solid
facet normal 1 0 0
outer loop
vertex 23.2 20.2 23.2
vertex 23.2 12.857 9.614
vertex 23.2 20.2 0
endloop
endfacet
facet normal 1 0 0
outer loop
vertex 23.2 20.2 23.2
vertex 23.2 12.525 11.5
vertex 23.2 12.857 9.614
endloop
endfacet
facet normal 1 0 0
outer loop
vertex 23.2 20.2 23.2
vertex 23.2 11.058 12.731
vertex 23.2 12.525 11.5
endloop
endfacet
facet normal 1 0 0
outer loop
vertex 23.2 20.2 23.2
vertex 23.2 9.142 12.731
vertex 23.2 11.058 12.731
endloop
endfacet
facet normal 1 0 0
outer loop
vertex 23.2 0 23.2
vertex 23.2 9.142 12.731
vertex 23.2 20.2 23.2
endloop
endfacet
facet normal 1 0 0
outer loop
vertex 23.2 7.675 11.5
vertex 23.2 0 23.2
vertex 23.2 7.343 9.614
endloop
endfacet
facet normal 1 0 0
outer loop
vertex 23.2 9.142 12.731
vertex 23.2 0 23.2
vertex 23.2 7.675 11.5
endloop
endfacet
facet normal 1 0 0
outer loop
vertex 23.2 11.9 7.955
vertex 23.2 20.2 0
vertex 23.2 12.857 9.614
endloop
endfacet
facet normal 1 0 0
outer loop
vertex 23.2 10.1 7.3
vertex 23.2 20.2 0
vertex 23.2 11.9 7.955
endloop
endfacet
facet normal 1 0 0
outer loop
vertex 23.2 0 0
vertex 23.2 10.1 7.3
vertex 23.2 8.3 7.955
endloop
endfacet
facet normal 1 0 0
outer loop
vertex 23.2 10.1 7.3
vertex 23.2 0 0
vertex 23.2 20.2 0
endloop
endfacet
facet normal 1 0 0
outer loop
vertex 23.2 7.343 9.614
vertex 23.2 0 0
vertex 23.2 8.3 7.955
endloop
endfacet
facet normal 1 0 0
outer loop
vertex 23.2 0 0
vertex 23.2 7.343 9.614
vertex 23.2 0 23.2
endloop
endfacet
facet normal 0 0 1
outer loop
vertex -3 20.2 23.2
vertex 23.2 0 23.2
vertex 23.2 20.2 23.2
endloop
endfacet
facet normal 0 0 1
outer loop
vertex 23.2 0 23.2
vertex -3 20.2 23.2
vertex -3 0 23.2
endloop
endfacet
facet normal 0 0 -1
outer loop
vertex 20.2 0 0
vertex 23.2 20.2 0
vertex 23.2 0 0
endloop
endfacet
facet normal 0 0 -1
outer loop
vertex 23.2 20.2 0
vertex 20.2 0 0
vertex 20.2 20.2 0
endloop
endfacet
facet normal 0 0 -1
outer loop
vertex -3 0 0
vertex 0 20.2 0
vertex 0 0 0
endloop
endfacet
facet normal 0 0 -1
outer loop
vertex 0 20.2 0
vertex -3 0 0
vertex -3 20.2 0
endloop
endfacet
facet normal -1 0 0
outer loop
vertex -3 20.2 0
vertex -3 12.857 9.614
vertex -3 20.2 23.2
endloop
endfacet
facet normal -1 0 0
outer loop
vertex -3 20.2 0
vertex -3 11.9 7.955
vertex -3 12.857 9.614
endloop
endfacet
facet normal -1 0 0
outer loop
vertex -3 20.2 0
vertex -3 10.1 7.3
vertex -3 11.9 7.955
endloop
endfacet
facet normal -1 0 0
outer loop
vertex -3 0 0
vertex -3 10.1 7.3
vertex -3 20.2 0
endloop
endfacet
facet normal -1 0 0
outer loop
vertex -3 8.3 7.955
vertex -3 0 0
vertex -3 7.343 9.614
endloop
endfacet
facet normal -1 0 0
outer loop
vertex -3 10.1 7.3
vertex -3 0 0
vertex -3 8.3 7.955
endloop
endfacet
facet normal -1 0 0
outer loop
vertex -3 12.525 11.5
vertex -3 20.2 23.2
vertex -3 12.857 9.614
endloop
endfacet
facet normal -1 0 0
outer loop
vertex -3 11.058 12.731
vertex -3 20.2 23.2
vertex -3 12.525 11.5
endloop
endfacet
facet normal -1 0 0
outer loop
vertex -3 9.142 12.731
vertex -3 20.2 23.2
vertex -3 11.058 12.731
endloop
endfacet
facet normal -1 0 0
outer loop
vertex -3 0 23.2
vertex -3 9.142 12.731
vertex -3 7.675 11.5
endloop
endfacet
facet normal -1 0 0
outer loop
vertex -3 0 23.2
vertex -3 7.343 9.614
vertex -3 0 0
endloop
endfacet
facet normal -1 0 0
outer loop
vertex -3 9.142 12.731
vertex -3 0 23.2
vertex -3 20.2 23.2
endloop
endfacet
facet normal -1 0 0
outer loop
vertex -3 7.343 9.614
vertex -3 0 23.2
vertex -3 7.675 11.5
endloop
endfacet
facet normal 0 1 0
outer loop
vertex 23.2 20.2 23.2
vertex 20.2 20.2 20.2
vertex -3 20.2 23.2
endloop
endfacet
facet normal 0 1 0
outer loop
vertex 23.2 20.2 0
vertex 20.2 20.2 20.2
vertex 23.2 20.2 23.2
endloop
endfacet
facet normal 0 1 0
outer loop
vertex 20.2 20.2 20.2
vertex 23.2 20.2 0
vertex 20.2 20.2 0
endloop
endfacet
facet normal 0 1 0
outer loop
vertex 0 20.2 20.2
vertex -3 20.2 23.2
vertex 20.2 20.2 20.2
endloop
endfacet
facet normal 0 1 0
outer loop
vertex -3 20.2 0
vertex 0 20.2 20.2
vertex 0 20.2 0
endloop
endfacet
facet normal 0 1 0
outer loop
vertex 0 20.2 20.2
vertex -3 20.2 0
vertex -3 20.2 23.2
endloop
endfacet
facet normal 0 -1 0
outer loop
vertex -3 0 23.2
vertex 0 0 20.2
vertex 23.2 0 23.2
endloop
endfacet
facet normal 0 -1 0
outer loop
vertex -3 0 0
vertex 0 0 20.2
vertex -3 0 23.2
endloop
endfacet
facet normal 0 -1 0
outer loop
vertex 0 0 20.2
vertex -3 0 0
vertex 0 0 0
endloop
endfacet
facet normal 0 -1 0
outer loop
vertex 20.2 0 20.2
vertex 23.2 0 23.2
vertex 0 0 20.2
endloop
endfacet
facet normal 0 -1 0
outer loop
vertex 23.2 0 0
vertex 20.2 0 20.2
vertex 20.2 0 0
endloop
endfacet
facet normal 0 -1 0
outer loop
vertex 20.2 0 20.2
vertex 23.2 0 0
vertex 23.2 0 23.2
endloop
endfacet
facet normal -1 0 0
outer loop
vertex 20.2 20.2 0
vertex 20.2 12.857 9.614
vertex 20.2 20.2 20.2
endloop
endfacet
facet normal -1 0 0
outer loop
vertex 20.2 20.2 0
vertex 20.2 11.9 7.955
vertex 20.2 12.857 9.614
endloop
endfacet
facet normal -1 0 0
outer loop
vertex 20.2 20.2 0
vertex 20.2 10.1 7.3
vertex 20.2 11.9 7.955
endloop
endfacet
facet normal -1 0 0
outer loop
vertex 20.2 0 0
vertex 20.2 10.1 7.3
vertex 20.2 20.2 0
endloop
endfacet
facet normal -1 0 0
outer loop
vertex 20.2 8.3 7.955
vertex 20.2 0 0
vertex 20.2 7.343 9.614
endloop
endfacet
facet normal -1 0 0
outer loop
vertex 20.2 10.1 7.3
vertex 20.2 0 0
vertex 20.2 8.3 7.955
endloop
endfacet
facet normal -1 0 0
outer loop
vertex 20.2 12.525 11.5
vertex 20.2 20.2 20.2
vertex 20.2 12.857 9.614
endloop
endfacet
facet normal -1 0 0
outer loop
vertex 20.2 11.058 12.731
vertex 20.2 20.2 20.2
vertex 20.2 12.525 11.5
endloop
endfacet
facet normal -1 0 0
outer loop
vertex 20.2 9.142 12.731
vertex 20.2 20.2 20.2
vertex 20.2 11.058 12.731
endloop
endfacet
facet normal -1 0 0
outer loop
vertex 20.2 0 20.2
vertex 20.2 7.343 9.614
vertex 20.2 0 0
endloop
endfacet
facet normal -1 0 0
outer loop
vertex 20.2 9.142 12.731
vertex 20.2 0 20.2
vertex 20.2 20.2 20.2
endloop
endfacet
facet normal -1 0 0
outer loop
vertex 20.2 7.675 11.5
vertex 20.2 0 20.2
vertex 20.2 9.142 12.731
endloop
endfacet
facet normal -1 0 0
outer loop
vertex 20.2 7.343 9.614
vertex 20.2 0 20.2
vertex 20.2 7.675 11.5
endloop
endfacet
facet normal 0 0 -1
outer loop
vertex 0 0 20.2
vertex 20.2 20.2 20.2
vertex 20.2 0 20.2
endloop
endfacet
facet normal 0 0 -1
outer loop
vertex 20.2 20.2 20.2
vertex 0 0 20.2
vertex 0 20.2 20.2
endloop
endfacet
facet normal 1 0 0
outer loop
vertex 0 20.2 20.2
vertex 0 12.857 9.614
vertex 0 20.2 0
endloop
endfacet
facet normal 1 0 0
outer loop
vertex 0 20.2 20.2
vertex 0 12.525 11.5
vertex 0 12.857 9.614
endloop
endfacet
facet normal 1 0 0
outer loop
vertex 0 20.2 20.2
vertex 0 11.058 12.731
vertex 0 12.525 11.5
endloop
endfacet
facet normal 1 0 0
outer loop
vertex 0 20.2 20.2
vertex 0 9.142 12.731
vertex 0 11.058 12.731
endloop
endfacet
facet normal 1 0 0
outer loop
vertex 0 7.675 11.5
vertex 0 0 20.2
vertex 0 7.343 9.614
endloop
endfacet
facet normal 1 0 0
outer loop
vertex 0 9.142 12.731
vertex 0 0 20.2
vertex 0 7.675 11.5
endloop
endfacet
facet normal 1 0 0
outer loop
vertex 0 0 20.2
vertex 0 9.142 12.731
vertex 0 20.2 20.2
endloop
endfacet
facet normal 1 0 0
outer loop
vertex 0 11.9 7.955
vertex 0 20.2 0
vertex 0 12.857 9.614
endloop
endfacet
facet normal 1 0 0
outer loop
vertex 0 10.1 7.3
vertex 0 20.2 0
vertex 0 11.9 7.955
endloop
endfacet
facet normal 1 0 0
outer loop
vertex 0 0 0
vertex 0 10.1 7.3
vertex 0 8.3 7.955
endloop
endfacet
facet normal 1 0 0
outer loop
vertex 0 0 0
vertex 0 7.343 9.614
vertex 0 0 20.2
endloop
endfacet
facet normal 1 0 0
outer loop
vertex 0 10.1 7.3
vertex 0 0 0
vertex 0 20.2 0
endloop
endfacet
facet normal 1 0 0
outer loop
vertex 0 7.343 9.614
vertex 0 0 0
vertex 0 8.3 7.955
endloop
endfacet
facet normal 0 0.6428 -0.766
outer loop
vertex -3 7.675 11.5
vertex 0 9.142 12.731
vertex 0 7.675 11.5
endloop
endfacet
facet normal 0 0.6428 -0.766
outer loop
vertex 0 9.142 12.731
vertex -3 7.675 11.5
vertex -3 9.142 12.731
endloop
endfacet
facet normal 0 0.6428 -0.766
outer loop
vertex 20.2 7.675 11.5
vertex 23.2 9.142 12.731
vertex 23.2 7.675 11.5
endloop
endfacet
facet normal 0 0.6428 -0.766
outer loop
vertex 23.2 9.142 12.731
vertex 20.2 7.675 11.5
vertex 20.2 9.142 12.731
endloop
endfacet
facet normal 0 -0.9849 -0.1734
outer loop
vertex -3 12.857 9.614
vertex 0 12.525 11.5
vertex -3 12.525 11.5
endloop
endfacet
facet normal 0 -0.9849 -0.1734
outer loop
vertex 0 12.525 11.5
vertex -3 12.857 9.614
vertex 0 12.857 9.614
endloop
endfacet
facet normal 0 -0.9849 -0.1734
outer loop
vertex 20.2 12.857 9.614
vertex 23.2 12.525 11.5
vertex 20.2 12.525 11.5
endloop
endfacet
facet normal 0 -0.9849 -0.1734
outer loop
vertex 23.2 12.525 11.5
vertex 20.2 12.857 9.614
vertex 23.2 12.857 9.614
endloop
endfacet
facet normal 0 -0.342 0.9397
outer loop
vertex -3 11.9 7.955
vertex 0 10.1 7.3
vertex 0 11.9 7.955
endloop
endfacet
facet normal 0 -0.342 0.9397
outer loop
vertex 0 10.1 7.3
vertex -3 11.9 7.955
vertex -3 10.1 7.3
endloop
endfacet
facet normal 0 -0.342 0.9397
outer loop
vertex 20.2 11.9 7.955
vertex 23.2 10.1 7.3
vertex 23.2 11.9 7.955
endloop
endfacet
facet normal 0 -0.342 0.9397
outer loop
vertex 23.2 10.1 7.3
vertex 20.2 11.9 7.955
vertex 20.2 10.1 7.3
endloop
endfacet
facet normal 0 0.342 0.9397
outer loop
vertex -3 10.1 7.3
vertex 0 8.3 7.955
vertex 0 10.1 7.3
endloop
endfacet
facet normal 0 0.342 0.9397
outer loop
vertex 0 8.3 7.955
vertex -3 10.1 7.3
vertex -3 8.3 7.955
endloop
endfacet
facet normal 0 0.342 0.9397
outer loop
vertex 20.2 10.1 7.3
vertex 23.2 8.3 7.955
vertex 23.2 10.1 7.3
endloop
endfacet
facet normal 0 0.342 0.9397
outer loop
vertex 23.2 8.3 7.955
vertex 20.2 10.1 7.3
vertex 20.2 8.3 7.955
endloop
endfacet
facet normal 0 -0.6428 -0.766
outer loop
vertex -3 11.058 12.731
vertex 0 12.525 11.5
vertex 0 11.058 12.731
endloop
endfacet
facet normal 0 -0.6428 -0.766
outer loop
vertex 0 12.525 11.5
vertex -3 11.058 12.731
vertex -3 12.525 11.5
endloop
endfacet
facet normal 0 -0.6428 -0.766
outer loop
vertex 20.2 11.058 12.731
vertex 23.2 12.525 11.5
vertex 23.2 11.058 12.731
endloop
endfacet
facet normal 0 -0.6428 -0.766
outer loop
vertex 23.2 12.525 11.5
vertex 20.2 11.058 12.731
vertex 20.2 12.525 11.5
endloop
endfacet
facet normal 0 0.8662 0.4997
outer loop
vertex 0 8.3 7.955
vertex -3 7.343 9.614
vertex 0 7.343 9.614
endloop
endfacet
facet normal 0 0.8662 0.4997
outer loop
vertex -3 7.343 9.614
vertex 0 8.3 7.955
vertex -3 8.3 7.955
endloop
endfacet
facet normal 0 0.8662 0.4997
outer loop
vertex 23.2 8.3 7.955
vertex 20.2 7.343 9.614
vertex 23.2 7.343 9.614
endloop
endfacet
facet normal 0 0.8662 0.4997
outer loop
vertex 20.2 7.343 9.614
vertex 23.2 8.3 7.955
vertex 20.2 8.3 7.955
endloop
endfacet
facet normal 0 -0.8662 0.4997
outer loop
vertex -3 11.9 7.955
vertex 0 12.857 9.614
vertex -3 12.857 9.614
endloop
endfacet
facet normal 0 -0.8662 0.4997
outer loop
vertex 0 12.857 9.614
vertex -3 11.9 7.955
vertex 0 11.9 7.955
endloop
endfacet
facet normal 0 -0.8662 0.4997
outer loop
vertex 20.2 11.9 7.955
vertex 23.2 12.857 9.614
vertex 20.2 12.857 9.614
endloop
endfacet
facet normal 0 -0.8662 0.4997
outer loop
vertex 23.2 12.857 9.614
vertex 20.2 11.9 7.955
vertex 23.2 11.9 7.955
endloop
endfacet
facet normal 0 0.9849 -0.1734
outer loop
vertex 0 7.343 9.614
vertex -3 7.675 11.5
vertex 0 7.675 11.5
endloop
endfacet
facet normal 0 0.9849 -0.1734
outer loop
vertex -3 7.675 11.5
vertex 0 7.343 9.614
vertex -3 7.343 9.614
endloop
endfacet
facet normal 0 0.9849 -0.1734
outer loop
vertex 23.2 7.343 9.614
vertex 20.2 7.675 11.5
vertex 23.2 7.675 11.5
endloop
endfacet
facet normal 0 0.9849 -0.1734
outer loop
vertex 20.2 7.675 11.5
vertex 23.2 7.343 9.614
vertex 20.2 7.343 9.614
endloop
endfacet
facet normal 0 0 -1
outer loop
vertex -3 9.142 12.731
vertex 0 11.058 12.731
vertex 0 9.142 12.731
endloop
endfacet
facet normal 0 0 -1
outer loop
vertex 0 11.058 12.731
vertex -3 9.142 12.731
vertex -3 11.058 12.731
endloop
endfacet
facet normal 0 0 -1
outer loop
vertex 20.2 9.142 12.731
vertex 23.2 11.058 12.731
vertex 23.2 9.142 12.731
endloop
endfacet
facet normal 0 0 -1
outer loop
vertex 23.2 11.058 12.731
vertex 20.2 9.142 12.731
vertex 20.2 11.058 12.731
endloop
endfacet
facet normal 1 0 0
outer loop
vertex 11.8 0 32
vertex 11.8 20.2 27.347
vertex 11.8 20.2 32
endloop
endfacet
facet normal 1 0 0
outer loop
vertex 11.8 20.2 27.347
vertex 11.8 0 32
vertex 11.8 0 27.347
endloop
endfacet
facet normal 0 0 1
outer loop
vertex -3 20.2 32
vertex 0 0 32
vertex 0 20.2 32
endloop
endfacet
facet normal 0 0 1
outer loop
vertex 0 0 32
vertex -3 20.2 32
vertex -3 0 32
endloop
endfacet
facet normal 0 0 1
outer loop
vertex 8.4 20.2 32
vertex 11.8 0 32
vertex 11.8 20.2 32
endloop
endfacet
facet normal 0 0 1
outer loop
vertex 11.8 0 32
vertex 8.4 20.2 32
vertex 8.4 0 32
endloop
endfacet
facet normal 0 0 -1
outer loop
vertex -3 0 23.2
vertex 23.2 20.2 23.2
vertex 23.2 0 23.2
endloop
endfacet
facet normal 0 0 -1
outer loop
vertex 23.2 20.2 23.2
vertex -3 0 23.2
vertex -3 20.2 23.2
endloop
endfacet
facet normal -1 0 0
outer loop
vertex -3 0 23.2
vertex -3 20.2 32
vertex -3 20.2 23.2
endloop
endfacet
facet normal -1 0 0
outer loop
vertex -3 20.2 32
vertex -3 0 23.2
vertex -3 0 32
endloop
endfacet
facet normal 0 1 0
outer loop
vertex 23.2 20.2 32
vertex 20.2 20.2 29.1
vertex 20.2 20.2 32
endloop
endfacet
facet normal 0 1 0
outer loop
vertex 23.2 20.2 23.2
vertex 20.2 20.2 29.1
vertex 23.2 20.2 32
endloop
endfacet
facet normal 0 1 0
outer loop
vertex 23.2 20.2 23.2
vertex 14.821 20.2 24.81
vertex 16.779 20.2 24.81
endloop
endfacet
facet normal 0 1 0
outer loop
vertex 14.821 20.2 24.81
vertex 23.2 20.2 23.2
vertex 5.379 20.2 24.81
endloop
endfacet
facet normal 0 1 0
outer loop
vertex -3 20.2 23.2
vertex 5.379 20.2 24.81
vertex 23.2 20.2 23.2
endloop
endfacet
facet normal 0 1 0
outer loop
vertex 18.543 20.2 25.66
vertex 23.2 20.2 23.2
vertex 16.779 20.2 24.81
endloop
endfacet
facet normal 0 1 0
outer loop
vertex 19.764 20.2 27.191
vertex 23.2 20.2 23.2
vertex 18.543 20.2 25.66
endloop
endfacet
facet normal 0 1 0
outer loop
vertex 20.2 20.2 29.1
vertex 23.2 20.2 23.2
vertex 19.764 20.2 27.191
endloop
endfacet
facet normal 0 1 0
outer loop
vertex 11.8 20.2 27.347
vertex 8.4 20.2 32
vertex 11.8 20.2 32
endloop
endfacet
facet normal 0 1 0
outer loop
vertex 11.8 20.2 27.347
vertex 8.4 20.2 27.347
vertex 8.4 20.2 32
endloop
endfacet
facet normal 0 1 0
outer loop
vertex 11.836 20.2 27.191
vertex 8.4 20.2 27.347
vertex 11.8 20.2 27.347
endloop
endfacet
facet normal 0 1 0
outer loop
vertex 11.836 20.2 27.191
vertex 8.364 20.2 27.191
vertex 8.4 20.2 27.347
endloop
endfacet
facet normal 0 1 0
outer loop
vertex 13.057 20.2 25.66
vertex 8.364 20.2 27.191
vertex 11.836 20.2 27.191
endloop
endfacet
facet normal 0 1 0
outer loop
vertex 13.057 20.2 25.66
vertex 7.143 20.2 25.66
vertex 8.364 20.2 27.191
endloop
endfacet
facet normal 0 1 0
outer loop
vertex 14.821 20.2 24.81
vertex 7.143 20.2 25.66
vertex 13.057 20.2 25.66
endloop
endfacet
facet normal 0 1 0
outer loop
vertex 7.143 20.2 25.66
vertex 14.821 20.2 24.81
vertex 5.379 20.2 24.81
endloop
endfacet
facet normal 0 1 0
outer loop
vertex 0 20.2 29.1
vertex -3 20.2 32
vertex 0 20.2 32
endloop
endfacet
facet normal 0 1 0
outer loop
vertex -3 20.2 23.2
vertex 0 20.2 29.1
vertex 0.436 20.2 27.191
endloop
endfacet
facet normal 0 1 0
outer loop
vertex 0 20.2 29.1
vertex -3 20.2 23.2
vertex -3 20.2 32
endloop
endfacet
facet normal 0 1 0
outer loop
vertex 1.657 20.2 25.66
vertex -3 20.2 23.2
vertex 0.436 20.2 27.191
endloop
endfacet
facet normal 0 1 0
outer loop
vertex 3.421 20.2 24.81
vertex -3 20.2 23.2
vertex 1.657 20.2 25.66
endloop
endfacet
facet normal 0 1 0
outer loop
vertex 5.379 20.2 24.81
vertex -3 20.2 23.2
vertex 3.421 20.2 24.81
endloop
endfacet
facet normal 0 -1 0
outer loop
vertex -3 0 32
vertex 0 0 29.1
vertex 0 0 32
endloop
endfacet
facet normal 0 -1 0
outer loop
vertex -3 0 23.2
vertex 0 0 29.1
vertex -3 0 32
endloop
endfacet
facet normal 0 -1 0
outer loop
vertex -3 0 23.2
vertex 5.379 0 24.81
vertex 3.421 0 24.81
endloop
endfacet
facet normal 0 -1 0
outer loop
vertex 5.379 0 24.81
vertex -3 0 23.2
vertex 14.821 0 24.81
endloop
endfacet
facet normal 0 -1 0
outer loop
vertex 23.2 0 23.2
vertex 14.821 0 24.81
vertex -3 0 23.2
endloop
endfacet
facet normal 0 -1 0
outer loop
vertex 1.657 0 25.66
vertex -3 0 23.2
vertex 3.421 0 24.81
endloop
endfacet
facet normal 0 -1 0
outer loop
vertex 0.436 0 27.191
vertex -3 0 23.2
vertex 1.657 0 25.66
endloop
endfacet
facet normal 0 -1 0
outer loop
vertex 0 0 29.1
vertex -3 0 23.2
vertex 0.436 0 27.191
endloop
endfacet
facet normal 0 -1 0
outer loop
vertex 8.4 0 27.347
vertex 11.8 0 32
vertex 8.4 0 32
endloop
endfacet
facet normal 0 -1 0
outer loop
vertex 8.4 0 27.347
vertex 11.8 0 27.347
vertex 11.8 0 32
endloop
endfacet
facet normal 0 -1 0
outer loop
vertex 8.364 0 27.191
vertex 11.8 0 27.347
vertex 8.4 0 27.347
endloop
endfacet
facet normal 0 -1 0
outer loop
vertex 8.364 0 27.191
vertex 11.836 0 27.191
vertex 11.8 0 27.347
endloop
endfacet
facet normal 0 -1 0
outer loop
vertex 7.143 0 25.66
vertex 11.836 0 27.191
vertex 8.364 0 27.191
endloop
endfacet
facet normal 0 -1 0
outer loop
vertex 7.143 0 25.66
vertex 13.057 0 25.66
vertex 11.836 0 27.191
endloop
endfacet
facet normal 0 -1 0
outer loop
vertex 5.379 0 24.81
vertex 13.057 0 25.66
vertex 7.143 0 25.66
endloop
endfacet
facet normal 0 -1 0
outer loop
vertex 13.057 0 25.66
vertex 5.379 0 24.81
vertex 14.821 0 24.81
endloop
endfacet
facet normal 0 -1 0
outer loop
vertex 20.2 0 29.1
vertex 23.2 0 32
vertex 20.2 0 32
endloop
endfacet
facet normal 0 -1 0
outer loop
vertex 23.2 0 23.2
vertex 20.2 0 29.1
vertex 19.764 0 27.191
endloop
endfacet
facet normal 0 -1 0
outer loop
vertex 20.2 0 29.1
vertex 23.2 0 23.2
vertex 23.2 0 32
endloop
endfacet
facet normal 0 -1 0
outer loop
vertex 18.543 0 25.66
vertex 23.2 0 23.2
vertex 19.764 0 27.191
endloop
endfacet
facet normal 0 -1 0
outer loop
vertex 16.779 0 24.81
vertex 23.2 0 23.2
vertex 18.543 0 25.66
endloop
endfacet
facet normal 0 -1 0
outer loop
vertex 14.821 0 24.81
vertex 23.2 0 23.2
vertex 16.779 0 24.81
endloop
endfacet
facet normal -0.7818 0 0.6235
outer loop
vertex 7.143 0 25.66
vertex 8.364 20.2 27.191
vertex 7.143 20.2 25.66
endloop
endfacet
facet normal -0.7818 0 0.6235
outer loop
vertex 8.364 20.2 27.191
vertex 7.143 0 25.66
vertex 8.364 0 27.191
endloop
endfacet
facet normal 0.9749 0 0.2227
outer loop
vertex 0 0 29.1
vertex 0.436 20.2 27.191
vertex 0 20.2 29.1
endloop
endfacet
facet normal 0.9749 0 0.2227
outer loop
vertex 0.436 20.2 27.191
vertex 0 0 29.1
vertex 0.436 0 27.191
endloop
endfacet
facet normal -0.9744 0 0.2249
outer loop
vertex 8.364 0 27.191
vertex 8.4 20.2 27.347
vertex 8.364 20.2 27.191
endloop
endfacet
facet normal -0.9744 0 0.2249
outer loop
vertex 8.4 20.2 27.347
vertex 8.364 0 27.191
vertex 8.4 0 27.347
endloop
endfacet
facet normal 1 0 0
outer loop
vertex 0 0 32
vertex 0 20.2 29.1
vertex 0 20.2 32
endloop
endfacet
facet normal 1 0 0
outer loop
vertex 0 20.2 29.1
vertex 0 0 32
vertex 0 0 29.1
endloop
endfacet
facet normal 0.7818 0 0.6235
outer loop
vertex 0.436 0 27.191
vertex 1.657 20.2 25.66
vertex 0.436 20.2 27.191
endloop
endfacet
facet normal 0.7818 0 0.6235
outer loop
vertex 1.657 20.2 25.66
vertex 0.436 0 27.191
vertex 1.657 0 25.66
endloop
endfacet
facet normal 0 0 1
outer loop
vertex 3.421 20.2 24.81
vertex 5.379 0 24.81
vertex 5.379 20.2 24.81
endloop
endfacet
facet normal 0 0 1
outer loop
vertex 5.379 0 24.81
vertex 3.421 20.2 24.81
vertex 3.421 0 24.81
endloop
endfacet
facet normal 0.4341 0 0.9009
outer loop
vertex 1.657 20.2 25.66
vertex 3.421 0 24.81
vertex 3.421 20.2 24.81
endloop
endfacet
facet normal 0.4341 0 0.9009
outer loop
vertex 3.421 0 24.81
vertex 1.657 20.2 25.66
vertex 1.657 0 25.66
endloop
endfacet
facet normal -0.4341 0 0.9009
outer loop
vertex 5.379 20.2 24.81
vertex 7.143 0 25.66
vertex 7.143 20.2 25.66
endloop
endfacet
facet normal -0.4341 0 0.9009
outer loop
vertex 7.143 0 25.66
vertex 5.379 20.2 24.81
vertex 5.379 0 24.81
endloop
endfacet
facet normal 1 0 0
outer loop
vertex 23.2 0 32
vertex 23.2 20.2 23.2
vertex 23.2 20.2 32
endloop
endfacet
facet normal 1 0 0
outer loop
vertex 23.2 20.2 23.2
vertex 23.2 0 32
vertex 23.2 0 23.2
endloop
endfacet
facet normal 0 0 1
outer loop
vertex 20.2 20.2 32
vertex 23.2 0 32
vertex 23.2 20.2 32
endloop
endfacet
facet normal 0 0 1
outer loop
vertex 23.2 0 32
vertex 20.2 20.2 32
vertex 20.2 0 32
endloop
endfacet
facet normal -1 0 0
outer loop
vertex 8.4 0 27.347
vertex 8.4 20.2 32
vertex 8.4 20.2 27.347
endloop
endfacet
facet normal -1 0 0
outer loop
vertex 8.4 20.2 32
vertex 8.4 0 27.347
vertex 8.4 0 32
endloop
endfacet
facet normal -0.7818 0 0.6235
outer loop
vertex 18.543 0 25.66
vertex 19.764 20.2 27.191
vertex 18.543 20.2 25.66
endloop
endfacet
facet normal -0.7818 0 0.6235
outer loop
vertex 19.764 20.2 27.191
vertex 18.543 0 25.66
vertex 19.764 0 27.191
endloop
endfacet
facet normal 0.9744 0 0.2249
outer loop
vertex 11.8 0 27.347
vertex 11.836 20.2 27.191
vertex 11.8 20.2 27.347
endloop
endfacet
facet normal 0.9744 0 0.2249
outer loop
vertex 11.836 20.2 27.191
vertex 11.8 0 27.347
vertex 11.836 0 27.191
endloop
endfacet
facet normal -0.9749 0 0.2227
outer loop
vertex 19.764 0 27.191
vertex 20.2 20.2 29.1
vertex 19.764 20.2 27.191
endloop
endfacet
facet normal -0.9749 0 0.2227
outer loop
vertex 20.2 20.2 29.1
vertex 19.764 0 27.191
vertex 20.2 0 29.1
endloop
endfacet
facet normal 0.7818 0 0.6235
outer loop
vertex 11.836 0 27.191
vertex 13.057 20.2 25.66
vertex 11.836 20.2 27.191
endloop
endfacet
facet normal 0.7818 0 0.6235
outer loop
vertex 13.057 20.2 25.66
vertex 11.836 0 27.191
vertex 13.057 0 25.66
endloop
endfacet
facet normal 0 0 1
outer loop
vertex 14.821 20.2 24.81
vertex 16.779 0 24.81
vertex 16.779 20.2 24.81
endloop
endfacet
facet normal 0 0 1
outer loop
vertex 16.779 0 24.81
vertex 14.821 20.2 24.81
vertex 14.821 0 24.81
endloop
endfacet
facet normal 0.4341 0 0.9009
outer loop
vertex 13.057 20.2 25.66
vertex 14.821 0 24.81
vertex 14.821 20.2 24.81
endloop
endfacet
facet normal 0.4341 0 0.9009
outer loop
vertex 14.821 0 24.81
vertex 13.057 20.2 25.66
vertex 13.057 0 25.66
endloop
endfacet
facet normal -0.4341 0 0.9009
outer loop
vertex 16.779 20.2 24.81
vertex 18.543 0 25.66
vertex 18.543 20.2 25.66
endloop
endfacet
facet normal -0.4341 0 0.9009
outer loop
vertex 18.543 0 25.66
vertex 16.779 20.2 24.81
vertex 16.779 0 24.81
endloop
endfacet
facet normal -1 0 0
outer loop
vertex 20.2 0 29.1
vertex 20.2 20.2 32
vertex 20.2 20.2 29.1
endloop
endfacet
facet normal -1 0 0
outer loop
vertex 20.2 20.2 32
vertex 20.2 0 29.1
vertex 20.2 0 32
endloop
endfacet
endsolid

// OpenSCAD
profil_width=20.2;
wallThickness=3;

spoolAxisDiameter=8.8;
spoolAxisRadius=spoolAxisDiameter/2;

profilCap();

module profilCap(){
	union(){
		difference(){
			
			translate([-wallThickness,0,0])cube([profil_width+(wallThickness*2),profil_width,profil_width+wallThickness]);
			cube([profil_width,profil_width,profil_width]);
			#translate([-profil_width/2,profil_width/2,profil_width/2])rotate([0,90,0])cylinder(h=profil_width*2,r=5.6/2);
		}
		#translate([-3,0,profil_width+wallThickness])axisHolder();
		#translate([8.4,0,profil_width+wallThickness])axisHolder();
	}
}

module axisHolder(){
	difference(){
		#cube([spoolAxisDiameter+(wallThickness*2),profil_width,spoolAxisDiameter]);
		hull(){
			#translate([(spoolAxisDiameter+(wallThickness*2))/2,profil_width,(spoolAxisDiameter+wallThickness)/2])rotate([90,0,0])cylinder(h=profil_width+0.1,r=spoolAxisRadius);
			#translate([(spoolAxisDiameter+(wallThickness*2))/2,profil_width+0.1,(spoolAxisDiameter+wallThickness)])rotate([90,0,0])cylinder(h=profil_width+0.1,r=spoolAxisRadius);
		}
	}
}
